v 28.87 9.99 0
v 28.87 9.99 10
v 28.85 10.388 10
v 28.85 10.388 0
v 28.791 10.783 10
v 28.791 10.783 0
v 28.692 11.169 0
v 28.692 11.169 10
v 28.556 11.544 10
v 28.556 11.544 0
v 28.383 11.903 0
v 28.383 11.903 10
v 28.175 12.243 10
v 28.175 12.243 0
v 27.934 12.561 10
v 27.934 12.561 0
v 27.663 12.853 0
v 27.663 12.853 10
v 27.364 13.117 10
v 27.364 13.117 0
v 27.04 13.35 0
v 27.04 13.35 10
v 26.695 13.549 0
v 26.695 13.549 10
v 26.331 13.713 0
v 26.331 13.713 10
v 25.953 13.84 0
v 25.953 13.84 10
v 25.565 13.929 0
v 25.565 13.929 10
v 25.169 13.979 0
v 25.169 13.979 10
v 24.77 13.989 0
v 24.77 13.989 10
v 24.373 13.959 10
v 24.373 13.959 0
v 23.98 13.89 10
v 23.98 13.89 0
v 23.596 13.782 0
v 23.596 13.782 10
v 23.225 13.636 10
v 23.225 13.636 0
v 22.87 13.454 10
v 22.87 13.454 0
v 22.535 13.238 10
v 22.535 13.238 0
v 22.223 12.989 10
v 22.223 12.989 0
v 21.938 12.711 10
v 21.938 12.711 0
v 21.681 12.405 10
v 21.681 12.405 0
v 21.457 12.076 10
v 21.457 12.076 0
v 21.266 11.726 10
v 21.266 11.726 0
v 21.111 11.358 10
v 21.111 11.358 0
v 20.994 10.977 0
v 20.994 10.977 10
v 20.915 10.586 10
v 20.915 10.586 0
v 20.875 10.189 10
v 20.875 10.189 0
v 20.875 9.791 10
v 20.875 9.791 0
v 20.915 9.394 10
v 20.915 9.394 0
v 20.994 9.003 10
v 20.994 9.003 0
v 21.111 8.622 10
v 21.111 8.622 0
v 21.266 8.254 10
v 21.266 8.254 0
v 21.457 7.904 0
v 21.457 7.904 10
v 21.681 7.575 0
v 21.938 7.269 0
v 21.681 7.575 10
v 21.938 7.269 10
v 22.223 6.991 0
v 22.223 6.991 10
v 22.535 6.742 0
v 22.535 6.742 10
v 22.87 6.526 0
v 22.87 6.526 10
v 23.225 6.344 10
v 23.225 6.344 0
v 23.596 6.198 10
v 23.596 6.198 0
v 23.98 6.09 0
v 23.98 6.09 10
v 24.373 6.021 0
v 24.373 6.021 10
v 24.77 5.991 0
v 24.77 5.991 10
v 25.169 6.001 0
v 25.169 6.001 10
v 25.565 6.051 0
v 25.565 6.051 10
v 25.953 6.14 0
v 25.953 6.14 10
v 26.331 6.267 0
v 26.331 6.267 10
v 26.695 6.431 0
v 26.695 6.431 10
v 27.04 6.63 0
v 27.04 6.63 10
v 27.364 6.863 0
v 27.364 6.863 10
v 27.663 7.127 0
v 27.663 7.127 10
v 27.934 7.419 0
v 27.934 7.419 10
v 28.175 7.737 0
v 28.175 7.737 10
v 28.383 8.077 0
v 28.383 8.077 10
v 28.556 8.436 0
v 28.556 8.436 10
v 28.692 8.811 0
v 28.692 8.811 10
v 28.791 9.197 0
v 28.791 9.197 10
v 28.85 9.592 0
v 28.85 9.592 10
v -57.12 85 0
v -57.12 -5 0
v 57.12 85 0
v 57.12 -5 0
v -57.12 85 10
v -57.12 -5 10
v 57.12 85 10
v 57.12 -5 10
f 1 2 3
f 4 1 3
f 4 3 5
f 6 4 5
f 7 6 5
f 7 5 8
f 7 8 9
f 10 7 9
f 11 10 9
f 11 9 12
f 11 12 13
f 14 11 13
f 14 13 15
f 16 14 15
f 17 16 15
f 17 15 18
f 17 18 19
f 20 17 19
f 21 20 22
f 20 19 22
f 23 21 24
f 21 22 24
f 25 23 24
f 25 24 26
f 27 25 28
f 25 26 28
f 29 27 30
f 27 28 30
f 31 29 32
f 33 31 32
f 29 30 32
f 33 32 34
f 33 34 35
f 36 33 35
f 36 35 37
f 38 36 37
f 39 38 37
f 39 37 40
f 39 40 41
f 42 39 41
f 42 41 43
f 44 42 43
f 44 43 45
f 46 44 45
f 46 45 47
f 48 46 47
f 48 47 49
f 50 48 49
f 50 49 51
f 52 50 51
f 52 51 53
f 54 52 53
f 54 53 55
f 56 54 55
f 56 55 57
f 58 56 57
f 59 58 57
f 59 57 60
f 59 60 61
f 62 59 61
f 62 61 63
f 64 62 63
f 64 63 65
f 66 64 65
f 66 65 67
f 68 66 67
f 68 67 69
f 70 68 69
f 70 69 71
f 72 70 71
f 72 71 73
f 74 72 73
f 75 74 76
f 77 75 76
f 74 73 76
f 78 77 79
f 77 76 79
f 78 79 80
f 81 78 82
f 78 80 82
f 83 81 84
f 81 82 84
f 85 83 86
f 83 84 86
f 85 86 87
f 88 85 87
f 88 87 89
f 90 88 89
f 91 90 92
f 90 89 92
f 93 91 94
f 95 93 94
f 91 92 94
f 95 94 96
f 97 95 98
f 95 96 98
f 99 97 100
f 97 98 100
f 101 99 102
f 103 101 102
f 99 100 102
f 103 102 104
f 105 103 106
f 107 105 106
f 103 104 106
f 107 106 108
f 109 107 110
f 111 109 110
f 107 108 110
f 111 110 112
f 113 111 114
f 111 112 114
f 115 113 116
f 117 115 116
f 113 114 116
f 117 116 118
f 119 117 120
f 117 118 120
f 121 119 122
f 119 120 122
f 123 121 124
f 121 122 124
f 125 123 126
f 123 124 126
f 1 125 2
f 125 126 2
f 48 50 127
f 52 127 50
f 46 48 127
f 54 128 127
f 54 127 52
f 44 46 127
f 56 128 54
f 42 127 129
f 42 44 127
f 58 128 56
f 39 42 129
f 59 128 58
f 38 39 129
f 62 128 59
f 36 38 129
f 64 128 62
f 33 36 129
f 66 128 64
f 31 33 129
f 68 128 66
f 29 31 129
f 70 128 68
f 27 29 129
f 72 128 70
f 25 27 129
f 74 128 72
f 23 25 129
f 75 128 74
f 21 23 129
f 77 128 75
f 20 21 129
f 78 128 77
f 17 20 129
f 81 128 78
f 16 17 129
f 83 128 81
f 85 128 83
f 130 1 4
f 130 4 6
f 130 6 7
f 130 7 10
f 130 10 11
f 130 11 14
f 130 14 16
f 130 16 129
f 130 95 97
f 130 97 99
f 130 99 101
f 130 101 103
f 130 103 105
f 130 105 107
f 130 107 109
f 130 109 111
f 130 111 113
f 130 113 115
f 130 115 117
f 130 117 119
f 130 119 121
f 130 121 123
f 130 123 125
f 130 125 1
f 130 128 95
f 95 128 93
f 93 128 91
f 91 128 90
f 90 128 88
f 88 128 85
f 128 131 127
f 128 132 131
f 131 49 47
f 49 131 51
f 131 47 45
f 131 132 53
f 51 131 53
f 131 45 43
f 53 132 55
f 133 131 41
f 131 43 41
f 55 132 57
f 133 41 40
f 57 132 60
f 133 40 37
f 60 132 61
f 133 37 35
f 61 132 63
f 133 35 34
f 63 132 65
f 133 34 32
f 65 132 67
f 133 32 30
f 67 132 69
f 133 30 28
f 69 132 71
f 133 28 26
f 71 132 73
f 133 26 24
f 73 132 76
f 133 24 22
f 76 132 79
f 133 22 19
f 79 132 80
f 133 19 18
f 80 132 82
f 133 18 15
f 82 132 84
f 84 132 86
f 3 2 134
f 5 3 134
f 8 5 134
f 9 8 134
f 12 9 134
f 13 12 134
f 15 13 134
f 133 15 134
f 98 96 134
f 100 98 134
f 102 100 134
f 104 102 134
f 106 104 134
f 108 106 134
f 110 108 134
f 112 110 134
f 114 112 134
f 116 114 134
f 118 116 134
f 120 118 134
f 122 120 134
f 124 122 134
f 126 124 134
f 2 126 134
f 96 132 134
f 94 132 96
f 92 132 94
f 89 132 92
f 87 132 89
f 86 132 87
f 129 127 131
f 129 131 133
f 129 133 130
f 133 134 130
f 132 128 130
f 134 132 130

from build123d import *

# Parameters (mm, degrees)
SKETCH1_W           = 114.24
SKETCH1_H           = 10
BOSS_EXTRUDE1_DEPTH = 10
SKETCH3_W           = 114.24
SKETCH3_H           = 10
BOSS_EXTRUDE2_DEPTH = 80
SKETCH4_R           = 4
CUT_EXTRUDE1_DEPTH  = 103.896522779


with BuildPart() as part:
    # Sketch1 → Boss-Extrude1 (new body)
    with BuildSketch(Plane.XY):
        Rectangle(SKETCH1_W, SKETCH1_H)
    extrude(amount=BOSS_EXTRUDE1_DEPTH)

    # Sketch3 → Boss-Extrude2 (add)
    with BuildSketch(Plane(origin=(0, 5, 0), x_dir=(1, 0, 0), z_dir=(0, 1, 0))):
        with Locations((0, -5)):
            Rectangle(SKETCH3_W, SKETCH3_H)
    extrude(amount=BOSS_EXTRUDE2_DEPTH)

    # Sketch4 → Cut-Extrude1 (cut, through all)
    with BuildSketch(Plane.XY.offset(10)):
        with Locations((24.87, 9.99)):
            Circle(SKETCH4_R)
    extrude(amount=-CUT_EXTRUDE1_DEPTH, mode=Mode.SUBTRACT)


solid = part.part
